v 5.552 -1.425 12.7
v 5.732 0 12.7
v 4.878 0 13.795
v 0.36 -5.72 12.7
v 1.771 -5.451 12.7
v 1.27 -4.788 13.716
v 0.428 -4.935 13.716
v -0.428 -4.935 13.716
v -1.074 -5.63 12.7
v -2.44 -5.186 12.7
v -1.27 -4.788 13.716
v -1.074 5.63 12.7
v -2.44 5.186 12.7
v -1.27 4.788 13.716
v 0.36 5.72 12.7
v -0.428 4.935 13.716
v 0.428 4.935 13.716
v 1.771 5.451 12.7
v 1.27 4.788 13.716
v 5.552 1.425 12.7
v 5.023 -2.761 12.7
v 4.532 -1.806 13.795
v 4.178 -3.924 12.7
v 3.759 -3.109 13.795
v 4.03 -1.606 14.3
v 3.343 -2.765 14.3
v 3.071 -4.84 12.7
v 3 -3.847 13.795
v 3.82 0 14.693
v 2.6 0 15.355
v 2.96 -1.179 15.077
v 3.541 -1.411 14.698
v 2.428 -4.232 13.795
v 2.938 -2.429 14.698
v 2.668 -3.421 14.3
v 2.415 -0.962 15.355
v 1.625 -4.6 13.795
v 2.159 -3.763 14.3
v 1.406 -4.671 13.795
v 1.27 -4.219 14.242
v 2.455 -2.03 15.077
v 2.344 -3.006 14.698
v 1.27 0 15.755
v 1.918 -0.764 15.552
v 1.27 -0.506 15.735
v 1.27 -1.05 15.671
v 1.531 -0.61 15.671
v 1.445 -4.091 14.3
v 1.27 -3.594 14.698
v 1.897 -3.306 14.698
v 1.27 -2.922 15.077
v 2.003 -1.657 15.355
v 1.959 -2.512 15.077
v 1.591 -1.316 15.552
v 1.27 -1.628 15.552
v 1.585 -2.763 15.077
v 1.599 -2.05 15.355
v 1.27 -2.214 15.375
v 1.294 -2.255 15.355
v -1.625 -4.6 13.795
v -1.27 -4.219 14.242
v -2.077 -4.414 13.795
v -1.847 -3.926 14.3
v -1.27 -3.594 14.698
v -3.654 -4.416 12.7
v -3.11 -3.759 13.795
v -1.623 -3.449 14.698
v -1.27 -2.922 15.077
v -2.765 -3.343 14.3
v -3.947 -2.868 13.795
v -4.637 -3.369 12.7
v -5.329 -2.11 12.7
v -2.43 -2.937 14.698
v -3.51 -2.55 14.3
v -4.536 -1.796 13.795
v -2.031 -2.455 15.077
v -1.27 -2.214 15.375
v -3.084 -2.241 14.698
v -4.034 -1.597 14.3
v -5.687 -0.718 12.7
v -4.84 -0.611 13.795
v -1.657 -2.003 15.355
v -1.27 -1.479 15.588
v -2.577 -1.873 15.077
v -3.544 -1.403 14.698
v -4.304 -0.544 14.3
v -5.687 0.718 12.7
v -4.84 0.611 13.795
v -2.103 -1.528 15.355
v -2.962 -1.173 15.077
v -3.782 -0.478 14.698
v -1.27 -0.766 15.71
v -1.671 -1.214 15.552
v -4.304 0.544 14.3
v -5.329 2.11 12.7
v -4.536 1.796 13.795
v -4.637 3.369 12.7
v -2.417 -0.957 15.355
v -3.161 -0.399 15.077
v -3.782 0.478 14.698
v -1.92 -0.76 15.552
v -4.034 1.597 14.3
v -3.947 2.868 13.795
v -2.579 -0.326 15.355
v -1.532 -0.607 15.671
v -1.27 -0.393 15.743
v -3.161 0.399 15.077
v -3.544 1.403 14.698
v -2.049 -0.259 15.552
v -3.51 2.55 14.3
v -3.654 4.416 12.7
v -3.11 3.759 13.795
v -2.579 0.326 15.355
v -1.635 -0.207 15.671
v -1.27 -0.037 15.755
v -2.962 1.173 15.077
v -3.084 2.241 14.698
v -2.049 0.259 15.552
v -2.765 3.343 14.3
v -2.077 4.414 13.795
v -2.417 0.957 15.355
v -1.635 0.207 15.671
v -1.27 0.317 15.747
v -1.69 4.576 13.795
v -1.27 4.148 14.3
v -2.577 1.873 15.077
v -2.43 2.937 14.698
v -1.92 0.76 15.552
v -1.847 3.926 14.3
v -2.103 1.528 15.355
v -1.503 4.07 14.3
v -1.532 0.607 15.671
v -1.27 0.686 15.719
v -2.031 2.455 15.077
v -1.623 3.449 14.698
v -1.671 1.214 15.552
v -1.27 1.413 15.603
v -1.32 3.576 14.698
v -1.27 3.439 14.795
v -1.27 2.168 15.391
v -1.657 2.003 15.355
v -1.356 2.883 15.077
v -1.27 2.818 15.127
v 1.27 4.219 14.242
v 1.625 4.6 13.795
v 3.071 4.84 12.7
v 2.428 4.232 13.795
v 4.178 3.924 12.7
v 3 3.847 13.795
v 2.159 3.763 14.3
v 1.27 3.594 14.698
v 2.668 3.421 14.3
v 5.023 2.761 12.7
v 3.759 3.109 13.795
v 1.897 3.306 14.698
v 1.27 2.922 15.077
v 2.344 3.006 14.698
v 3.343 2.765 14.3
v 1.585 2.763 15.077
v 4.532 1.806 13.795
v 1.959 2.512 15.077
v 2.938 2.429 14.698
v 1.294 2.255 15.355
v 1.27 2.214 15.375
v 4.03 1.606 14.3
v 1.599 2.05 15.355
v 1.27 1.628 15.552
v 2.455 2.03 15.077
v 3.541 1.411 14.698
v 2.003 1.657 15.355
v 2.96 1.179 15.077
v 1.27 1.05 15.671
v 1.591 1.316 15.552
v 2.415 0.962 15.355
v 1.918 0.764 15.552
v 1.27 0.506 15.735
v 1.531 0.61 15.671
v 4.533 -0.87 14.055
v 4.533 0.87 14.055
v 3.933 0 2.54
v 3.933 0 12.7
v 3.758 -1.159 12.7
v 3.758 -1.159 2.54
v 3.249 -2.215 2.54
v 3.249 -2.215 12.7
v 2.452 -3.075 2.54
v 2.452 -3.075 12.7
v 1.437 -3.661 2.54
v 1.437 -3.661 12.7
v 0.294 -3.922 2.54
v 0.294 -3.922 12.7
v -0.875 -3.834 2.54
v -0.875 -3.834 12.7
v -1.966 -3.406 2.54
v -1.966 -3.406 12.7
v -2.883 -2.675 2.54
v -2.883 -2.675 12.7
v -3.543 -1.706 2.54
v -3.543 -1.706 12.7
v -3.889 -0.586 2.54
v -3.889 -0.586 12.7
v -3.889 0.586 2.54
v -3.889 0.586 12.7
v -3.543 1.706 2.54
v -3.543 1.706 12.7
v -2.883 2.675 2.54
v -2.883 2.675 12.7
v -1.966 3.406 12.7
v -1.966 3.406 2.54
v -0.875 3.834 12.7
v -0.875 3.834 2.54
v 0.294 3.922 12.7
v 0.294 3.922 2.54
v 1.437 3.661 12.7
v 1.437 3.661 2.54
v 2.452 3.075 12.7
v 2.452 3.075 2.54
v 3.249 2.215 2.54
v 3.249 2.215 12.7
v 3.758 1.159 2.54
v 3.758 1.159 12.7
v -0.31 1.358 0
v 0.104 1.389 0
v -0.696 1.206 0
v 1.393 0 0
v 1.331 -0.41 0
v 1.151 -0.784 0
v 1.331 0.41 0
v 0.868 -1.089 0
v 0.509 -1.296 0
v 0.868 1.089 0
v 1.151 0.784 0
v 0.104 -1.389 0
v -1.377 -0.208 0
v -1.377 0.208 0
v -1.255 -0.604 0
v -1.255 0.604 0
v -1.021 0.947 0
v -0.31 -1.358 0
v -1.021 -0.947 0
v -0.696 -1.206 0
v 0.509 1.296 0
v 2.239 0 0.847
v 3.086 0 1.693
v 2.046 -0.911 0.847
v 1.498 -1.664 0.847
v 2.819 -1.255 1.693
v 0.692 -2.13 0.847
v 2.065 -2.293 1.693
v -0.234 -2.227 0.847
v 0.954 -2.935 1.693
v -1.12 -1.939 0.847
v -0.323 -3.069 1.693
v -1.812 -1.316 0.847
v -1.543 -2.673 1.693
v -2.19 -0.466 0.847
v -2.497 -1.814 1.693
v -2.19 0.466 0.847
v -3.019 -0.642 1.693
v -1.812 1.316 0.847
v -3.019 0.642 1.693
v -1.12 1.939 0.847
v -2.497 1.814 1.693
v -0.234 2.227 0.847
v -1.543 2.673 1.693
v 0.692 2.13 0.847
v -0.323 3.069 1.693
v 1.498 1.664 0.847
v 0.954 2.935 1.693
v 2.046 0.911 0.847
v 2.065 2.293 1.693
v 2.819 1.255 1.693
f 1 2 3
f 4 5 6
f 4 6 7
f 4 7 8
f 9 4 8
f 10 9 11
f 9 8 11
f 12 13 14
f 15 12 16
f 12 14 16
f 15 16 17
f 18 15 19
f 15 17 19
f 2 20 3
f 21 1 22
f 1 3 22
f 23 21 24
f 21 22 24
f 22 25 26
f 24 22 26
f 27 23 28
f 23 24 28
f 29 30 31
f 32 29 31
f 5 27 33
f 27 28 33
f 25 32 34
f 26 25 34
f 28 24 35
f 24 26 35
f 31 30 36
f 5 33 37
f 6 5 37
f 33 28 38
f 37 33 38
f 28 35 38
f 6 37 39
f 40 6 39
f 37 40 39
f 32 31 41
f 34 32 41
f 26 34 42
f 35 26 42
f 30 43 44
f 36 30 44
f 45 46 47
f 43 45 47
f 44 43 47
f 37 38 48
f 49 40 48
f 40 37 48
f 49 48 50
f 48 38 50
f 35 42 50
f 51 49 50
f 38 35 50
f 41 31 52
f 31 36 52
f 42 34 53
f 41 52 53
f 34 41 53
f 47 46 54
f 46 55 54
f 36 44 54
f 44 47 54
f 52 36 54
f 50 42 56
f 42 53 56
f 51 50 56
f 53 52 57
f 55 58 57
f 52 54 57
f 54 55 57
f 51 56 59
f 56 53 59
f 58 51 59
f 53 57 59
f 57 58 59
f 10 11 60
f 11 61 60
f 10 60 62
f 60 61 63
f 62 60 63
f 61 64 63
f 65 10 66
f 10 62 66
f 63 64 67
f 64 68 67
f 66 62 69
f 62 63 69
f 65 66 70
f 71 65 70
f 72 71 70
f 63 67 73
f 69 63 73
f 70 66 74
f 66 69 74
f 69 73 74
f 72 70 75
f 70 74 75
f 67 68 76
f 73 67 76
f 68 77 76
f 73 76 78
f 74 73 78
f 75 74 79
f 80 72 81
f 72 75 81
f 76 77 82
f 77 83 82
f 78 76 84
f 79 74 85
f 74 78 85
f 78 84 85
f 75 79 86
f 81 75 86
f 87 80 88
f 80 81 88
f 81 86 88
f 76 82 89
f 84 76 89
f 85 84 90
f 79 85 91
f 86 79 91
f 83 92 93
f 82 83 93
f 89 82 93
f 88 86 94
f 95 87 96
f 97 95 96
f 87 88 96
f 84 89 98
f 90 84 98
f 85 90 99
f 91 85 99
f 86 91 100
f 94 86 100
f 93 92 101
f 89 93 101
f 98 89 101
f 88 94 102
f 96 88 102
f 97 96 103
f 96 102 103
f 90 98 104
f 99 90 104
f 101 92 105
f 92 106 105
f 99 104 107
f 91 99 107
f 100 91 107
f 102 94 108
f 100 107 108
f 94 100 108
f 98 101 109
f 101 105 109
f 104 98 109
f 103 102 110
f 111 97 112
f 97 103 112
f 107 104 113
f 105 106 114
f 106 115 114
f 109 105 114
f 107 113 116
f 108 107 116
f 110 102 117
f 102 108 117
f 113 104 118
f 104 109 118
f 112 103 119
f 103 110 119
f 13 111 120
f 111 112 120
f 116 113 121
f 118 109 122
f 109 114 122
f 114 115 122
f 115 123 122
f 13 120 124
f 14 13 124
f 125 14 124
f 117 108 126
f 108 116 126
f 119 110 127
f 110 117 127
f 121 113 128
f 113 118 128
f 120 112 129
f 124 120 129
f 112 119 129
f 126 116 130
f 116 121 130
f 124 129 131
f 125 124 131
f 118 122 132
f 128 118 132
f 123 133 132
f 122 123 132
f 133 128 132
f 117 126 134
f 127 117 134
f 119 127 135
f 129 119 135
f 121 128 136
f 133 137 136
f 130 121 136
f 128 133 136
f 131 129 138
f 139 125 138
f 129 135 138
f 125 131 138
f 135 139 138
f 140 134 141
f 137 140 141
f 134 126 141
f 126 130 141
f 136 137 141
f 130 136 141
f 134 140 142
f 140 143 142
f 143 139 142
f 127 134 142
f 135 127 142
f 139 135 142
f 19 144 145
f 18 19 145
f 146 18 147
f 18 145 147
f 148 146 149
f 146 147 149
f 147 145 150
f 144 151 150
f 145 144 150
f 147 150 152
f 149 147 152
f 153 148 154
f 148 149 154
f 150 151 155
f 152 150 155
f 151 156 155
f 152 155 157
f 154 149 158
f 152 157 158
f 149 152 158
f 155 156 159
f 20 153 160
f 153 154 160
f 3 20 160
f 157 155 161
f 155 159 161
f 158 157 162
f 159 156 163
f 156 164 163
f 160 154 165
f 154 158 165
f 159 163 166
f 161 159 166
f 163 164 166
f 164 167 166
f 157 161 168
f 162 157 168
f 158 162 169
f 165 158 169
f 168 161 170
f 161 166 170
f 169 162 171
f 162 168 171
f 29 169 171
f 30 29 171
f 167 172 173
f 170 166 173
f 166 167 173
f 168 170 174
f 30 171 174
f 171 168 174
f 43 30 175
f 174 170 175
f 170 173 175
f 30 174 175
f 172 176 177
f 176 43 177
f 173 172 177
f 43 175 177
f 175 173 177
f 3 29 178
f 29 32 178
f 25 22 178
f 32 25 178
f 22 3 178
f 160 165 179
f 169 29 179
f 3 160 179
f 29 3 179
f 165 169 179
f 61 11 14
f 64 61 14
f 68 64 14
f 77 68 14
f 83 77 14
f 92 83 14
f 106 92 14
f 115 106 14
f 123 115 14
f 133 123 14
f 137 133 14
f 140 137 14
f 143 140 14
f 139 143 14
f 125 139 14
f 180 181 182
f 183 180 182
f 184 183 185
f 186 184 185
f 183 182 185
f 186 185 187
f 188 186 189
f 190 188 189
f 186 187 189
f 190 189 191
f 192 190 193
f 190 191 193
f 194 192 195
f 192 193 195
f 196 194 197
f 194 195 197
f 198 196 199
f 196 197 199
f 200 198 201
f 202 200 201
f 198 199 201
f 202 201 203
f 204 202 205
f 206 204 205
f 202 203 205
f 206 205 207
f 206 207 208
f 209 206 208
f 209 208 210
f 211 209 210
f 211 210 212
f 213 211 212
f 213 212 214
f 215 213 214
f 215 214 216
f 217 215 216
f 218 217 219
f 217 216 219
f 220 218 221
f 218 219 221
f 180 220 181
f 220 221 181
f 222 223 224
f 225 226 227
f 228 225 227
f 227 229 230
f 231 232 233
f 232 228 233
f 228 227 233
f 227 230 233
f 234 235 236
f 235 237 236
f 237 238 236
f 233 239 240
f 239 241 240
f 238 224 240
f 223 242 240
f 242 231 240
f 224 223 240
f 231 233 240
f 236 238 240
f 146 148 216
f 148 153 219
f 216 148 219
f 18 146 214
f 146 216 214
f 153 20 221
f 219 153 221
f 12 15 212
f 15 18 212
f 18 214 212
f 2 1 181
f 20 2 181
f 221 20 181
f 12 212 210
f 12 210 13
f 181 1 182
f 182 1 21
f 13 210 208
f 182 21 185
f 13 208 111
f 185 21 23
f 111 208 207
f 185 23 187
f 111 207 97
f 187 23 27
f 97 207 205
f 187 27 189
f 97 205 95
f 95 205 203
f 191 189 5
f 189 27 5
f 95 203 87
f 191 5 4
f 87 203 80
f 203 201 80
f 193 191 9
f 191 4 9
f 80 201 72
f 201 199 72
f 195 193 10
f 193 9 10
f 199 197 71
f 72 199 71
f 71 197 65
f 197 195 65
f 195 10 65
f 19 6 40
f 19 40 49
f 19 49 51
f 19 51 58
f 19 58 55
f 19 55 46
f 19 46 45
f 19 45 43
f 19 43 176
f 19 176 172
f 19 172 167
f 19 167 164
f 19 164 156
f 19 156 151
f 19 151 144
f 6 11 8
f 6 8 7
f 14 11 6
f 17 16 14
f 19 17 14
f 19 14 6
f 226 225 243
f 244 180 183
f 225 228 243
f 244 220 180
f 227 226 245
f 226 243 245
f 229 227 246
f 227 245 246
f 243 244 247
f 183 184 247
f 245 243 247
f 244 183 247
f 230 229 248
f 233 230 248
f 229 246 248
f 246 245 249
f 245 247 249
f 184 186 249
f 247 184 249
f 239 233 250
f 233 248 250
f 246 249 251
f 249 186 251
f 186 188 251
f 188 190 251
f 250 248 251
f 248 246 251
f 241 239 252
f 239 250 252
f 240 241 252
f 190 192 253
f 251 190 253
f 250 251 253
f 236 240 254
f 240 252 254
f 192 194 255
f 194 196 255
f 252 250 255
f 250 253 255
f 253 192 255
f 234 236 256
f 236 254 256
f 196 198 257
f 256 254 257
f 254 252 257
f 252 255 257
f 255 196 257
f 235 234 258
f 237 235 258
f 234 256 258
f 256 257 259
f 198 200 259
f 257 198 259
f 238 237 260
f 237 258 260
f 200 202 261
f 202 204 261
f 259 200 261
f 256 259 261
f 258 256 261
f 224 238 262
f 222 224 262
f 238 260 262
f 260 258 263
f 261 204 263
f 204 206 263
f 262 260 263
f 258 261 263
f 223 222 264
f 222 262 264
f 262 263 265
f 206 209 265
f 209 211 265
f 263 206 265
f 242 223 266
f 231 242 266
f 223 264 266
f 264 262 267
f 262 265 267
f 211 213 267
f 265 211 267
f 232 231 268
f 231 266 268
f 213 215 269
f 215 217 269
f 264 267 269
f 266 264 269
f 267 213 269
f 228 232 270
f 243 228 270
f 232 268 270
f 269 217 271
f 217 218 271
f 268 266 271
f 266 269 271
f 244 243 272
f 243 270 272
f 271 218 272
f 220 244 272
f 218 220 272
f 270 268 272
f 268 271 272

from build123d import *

# Parameters (mm, degrees)
F3_W     = 2.54
F3_H     = 10.16
F4_DEPTH = 25.4
F5_SIZE  = 2.54


with BuildPart() as f1:
    # F0 (on Front) → F1 (revolve)
    with BuildSketch(Plane.XZ):
        with BuildLine():
            Line((0, 9.113751), (0, 0))
            Line((0, 0), (3.932627, 0))
            Line((3.932627, 0), (3.932627, 12.7))
            Line((3.932627, 12.7), (5.73178, 12.7))
            ThreePointArc((5.73178, 12.7), (3.276199, 15.028225), (0, 15.875))
            Line((0, 15.875), (0, 9.113751))
        make_face()
    revolve(axis=Axis((0, 0, -3.129652), (0, 0, -1)))

    # F3 (on offset) → F4 (cut)
    with BuildSketch(Plane.XY.offset(13.716)):
        Rectangle(F3_W, F3_H)
    extrude(amount=F4_DEPTH, mode=Mode.SUBTRACT)

    # F5
    f5_edges = [f1.edges().sort_by_distance(p)[0] for p in [
        (-3.932627, 0, 0),
    ]]
    chamfer(f5_edges, length=F5_SIZE)


solid = f1.part
